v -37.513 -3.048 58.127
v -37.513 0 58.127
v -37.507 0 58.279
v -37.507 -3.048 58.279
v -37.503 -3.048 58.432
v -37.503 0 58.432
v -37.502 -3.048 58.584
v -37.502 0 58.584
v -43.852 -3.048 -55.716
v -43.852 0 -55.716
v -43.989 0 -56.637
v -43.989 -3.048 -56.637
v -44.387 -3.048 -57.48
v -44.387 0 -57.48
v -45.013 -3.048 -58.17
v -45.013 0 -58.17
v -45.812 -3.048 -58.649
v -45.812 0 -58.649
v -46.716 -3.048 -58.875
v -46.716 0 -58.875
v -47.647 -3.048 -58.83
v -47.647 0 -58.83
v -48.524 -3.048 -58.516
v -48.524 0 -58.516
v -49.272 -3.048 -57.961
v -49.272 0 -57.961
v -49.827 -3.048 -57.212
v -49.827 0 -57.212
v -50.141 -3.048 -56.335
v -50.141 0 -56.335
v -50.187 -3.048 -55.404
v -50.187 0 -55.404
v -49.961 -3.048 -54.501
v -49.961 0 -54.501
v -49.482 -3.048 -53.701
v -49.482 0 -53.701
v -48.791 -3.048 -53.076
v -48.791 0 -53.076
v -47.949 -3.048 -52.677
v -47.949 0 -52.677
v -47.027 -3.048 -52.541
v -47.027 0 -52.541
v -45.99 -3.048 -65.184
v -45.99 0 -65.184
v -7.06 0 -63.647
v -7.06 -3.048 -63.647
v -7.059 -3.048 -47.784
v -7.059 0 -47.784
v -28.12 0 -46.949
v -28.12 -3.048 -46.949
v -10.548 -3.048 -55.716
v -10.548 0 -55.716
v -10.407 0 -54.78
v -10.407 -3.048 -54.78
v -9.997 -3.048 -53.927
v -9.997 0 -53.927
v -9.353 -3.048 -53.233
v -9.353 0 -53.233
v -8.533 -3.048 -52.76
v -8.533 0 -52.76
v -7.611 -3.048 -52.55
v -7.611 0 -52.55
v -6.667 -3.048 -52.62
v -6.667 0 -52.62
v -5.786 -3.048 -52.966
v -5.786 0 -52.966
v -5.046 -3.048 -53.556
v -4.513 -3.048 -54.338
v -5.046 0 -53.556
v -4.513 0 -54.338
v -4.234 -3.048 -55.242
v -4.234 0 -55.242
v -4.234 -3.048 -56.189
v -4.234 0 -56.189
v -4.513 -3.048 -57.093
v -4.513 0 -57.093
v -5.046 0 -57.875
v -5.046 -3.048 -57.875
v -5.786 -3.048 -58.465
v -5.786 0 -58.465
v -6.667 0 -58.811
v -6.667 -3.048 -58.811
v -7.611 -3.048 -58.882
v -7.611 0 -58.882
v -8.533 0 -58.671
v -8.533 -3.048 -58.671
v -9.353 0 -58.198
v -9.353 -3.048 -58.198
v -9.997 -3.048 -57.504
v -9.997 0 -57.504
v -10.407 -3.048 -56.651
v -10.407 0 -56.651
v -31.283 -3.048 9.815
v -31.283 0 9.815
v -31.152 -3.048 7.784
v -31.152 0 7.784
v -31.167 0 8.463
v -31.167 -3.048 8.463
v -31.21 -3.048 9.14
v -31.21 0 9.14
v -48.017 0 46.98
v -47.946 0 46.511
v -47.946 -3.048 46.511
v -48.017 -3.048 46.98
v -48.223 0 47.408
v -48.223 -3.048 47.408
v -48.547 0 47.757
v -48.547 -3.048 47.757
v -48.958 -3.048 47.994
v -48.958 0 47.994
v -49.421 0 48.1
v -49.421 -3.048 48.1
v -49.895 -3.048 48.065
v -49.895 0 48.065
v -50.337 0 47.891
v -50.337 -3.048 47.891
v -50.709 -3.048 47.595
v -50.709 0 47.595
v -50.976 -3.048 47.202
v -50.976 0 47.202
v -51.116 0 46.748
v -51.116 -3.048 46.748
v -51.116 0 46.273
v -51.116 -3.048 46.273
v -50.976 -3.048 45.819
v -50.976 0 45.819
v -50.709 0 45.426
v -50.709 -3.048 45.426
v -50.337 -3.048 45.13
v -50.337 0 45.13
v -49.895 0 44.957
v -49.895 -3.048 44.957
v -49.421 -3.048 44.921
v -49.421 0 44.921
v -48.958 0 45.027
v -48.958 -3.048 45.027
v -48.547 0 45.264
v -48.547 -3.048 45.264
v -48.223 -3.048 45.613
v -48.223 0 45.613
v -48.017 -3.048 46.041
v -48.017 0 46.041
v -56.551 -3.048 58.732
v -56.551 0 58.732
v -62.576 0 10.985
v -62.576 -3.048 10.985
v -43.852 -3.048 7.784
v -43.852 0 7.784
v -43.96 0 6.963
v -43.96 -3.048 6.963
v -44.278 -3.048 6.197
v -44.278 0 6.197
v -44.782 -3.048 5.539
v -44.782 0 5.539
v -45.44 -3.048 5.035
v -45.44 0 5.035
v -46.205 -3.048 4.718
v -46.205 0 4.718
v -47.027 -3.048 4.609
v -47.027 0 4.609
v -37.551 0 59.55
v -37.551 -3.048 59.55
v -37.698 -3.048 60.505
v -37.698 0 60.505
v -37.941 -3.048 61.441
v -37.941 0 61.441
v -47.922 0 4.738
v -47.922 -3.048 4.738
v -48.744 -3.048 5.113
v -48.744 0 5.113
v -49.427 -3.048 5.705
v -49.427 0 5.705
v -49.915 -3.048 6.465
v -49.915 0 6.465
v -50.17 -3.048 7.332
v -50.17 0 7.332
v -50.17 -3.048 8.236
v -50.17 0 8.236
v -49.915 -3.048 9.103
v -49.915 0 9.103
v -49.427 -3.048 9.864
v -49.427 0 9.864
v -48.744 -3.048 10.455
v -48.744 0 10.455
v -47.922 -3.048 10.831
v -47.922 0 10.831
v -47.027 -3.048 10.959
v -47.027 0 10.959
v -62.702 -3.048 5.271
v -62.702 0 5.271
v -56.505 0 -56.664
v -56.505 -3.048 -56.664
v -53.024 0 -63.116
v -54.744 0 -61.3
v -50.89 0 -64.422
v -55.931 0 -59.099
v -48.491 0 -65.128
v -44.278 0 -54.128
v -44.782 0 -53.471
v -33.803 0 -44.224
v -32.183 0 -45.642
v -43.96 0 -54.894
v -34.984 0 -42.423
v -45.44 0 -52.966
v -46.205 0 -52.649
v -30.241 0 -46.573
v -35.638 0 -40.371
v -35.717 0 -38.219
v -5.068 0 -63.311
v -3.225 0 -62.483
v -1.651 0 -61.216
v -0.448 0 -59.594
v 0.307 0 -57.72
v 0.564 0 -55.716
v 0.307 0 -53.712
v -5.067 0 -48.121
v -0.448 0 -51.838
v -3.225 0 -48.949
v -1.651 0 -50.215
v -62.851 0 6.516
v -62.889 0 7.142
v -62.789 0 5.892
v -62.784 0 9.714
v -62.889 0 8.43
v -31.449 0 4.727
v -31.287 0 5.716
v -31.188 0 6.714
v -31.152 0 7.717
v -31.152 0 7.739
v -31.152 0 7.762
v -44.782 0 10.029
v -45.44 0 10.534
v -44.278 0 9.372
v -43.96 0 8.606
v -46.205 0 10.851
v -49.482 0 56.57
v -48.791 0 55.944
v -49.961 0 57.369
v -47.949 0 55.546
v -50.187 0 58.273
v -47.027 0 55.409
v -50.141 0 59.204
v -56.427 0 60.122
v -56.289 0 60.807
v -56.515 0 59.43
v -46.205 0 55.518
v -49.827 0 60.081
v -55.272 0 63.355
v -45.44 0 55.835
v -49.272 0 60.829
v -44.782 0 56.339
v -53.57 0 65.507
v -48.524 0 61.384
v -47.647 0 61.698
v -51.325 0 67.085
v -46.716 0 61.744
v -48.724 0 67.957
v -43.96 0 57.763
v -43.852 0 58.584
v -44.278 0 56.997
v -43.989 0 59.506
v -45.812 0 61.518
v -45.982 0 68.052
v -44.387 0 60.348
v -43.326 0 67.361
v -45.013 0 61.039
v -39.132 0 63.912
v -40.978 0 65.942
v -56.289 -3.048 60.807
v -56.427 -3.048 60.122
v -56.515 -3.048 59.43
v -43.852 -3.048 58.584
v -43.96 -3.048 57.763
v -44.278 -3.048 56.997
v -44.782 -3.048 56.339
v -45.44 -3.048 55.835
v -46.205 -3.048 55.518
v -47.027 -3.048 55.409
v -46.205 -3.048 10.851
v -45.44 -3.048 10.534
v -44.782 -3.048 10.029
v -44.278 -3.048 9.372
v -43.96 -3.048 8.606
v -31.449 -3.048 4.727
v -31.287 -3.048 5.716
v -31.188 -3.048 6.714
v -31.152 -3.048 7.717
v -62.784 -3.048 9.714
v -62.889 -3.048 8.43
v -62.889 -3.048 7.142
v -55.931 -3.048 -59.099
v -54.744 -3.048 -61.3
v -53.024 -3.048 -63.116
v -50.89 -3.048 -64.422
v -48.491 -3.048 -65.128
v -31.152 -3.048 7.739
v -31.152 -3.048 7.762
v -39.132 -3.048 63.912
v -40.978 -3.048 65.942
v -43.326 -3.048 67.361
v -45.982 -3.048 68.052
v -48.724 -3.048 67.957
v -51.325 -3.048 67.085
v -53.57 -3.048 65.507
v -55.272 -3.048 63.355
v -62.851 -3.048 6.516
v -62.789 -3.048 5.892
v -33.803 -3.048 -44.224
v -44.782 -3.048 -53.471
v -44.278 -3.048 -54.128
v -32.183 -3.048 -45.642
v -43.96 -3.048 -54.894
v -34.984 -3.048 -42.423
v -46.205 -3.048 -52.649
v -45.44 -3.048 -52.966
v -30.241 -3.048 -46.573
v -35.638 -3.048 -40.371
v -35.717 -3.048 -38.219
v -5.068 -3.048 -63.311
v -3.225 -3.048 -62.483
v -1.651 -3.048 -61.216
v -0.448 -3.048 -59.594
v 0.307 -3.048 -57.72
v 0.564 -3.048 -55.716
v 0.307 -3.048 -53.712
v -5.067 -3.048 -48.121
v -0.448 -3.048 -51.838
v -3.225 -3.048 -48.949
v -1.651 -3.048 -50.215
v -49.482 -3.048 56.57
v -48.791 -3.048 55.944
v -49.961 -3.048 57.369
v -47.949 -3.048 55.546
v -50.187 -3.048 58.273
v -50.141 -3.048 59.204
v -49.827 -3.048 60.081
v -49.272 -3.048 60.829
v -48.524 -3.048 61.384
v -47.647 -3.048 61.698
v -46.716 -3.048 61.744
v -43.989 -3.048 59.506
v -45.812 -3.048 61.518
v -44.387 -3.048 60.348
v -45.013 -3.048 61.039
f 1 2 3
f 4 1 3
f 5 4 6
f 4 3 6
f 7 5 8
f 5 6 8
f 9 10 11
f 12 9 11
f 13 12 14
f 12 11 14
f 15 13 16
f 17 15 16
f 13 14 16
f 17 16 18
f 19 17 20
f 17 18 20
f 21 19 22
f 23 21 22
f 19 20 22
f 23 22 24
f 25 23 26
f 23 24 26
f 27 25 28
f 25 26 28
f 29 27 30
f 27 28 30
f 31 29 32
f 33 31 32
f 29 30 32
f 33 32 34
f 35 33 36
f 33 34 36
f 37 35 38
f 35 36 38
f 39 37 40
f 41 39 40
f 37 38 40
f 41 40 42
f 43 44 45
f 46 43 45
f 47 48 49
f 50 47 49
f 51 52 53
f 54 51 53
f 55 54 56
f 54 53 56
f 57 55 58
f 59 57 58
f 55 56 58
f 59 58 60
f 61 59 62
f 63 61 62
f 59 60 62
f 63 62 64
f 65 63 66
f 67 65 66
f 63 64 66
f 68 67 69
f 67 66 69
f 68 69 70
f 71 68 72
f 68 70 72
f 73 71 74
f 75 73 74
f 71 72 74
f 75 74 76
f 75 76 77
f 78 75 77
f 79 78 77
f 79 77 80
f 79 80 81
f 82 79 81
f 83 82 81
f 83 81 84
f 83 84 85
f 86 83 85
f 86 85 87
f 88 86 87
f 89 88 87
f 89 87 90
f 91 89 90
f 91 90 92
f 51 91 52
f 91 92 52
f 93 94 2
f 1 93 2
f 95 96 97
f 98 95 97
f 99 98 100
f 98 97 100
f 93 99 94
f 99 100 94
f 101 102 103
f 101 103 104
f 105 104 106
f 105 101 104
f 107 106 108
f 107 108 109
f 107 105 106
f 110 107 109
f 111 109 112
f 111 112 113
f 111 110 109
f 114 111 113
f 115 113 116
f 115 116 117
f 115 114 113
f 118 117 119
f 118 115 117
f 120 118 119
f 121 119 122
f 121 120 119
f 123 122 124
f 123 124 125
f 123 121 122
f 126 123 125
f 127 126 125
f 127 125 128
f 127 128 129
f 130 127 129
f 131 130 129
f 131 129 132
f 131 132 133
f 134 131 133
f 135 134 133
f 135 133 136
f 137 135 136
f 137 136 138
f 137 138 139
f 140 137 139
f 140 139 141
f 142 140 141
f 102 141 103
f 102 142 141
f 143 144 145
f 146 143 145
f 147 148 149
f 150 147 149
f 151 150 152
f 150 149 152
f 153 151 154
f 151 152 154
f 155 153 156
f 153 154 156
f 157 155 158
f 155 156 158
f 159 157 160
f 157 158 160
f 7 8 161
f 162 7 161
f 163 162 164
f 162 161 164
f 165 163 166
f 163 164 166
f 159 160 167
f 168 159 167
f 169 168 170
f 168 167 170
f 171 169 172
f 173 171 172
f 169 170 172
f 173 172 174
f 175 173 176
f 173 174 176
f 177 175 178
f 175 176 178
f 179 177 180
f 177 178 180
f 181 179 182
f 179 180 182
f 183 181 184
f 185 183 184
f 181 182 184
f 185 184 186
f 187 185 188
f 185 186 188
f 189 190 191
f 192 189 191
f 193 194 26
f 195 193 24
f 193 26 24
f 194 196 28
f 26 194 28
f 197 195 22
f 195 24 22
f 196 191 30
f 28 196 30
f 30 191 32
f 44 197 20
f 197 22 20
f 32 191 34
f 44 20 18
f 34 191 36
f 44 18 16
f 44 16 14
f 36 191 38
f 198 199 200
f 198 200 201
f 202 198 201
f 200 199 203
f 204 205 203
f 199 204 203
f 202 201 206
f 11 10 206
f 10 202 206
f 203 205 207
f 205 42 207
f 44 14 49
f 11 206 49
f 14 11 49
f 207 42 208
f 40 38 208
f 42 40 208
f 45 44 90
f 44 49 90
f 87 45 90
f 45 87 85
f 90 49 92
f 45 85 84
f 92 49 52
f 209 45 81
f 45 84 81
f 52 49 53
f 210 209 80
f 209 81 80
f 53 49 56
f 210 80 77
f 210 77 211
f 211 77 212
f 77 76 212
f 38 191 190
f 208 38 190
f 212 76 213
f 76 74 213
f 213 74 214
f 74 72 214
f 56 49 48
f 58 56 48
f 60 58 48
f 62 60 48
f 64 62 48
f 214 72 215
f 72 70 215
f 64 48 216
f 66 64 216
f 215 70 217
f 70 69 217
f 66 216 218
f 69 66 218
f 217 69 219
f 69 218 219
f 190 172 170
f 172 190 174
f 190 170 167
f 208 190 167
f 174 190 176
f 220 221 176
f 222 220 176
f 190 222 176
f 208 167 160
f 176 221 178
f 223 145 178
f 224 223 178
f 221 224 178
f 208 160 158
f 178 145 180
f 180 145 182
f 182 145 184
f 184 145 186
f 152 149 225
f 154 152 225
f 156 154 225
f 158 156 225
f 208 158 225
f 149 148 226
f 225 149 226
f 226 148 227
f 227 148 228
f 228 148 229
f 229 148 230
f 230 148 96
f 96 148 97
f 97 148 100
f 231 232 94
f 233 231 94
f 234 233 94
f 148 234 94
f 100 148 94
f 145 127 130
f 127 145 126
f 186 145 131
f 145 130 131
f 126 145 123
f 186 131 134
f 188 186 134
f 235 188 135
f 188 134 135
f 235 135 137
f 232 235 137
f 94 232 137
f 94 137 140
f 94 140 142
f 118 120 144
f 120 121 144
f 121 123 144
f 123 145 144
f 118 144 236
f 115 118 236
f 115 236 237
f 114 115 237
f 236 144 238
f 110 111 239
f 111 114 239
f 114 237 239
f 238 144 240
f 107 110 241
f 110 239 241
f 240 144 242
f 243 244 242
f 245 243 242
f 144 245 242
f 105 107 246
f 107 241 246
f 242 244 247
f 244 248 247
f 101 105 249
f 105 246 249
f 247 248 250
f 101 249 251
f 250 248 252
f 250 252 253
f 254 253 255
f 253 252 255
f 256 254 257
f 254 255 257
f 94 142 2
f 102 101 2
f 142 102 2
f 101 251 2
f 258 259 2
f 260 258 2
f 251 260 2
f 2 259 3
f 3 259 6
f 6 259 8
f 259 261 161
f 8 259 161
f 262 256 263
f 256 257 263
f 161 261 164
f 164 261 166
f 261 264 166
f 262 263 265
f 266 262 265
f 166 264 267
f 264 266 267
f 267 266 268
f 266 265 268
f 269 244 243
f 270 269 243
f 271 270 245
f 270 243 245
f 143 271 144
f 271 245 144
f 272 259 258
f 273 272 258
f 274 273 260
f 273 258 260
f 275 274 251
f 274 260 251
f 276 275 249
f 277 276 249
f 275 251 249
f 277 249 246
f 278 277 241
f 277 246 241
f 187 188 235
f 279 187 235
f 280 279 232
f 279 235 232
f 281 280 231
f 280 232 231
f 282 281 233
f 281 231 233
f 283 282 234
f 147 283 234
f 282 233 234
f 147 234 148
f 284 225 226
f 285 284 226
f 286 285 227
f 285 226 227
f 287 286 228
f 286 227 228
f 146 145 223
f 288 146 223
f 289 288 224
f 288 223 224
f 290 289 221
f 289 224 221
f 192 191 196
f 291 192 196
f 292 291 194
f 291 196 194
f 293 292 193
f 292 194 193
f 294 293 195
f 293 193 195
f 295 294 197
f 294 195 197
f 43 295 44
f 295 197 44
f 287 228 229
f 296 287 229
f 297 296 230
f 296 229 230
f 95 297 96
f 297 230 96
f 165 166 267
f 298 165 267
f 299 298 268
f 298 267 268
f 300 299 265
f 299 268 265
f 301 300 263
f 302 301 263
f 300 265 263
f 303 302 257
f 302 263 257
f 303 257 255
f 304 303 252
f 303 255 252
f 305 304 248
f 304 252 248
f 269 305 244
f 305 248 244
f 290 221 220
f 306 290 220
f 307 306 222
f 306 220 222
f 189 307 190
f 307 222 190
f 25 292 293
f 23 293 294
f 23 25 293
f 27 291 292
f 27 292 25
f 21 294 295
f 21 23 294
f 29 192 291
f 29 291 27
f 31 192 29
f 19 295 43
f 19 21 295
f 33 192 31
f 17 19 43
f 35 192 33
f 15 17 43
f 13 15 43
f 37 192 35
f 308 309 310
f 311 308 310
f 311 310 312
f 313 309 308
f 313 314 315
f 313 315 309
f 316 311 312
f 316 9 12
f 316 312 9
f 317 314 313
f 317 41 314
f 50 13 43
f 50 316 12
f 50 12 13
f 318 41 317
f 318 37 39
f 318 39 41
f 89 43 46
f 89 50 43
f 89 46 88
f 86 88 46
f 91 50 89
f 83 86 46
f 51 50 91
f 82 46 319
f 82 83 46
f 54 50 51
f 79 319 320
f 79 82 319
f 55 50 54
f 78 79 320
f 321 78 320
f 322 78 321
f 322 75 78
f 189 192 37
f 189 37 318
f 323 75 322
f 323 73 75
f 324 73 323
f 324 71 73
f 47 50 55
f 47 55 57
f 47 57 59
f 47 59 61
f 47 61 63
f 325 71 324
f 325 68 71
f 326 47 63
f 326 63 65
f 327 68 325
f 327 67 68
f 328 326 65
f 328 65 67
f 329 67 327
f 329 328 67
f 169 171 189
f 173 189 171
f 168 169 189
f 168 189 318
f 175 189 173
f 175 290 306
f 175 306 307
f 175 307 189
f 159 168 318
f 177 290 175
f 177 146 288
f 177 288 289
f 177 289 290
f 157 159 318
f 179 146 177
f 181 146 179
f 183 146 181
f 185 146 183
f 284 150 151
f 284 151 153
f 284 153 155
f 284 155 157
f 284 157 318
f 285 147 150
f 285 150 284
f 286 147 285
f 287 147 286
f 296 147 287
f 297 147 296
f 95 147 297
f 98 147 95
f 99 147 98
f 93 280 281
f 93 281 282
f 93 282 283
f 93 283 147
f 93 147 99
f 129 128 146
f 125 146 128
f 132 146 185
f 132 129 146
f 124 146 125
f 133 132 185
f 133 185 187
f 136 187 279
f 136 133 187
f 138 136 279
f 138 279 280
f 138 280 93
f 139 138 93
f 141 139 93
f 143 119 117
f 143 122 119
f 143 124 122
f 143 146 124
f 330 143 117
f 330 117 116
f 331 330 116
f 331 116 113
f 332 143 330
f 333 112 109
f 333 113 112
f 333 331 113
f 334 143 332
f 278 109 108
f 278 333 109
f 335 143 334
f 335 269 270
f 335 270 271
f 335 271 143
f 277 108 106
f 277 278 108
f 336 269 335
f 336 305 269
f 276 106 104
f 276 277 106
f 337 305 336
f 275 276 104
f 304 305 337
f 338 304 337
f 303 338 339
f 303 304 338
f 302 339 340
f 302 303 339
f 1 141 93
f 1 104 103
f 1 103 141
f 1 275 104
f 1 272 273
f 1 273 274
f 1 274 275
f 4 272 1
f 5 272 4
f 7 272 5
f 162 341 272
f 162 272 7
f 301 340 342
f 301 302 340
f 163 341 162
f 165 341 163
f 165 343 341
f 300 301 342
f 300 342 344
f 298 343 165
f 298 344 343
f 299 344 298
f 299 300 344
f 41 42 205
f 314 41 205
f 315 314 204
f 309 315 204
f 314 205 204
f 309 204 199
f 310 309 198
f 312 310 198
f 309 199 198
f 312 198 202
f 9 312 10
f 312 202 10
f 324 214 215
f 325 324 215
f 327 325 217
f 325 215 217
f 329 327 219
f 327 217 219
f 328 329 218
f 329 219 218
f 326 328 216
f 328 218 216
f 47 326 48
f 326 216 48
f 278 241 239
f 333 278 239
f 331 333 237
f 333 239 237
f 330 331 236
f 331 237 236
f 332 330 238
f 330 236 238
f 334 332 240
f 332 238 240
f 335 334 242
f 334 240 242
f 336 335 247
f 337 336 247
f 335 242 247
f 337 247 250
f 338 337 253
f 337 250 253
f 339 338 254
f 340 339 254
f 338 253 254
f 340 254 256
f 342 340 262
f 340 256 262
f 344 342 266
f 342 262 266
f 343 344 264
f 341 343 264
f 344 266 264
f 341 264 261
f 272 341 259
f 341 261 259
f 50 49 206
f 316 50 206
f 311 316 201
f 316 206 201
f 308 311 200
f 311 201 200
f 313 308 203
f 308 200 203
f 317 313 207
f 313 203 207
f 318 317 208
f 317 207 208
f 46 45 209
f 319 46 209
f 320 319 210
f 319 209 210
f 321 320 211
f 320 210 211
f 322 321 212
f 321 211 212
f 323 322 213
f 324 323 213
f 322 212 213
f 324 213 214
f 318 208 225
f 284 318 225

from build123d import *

# Parameters (mm, degrees)
F0_R     = 1.5939084554
F1_DEPTH = 3.048


with BuildPart() as f1:
    # F0 (on Front) → F1 (new body)
    with BuildSketch(Plane.XZ):
        with BuildLine():
            ThreePointArc((-37.513228268, 58.1266457065), (-37.5049761739, 58.3554311802), (-37.5022249461, 58.5843488964))
            ThreePointArc((-37.5022249461, 58.5843488964), (-37.6124710423, 60.0293519865), (-37.9406572675, 61.4409050085))
            Line((-37.9406572675, 61.4409050085), (-37.513228268, 58.1266457065))
        make_face()
        with BuildLine():
            Line((-37.513228268, 58.1266457065), (-37.9406572675, 61.4409050085))
            ThreePointArc((-37.9406572675, 61.4409050085), (-47.3561500663, 68.1036678461), (-56.2892930862, 60.8068967067))
            Line((-56.2892930862, 60.8068967067), (-56.5510749385, 58.7323567411))
            ThreePointArc((-56.5510749385, 58.7323567411), (-53.8145439942, 51.9016903581), (-47.0272249461, 49.0593488964))
            ThreePointArc((-47.0272249461, 49.0593488964), (-40.4558475366, 51.689232948), (-37.513228268, 58.1266457065))
        make_face()
        with BuildLine():
            ThreePointArc((-43.8522249461, 58.5843488964), (-44.7821609158, 56.3392848661), (-47.0272249461, 55.4093488964))
            ThreePointArc((-47.0272249461, 55.4093488964), (-49.2722889764, 60.8294129267), (-43.8522249461, 58.5843488964))
        make_face(mode=Mode.SUBTRACT)
        with BuildLine():
            Line((-31.2826202902, 9.8148781945), (-37.513228268, 58.1266457065))
            ThreePointArc((-37.513228268, 58.1266457065), (-40.4558475366, 51.689232948), (-47.0272249461, 49.0593488964))
            Line((-47.0272249461, 49.0593488964), (-47.0272249461, 23.6593488964))
            ThreePointArc((-47.0272249461, 23.6593488964), (-36.5443586302, 19.7059737355), (-31.2826202902, 9.8148781945))
        make_face()
        with BuildLine():
            Line((-56.5510749385, 58.7323567411), (-56.2892930862, 60.8068967067))
            ThreePointArc((-56.2892930862, 60.8068967067), (-56.4772836251, 59.7768320044), (-56.5510749385, 58.7323567411))
        make_face()
        with BuildLine():
            Line((-47.0272249461, 23.6593488964), (-47.0272249461, 49.0593488964))
            ThreePointArc((-47.0272249461, 49.0593488964), (-53.8145439942, 51.9016903581), (-56.5510749385, 58.7323567411))
            Line((-56.5510749385, 58.7323567411), (-62.5761934224, 10.9851619686))
            ThreePointArc((-62.5761934224, 10.9851619686), (-57.0572478145, 20.0893993335), (-47.0272249461, 23.6593488964))
        make_face()
        with Locations((-49.5402999222, 46.5105995536)):
            Circle(F0_R, mode=Mode.SUBTRACT)
        with BuildLine():
            ThreePointArc((-31.1522249461, 7.7843488964), (-31.1848573214, 8.8017048047), (-31.2826202902, 9.8148781945))
            ThreePointArc((-31.2826202902, 9.8148781945), (-36.5443586302, 19.7059737355), (-47.0272249461, 23.6593488964))
            Line((-47.0272249461, 23.6593488964), (-47.0272249461, 10.9593488964))
            ThreePointArc((-47.0272249461, 10.9593488964), (-44.7821609158, 10.0294129267), (-43.8522249461, 7.7843488964))
            ThreePointArc((-43.8522249461, 7.7843488964), (-44.7821609158, 5.5392848661), (-47.0272249461, 4.6093488964))
            Line((-47.0272249461, 4.6093488964), (-47.0272249461, -8.0906511036))
            ThreePointArc((-47.0272249461, -8.0906511036), (-36.9406754756, -4.4744089844), (-31.4494526235, 4.7267952233))
            Line((-31.4494526235, 4.7267952233), (-31.1523694634, 7.7166111531))
            ThreePointArc((-31.1523694634, 7.7166111531), (-31.1522610755, 7.7504799477), (-31.1522249461, 7.7843488964))
        make_face()
        with BuildLine():
            Line((-47.0272249461, 10.9593488964), (-47.0272249461, 23.6593488964))
            ThreePointArc((-47.0272249461, 23.6593488964), (-57.0572478145, 20.0893993335), (-62.5761934224, 10.9851619686))
            ThreePointArc((-62.5761934224, 10.9851619686), (-62.849805464, 9.0733681958), (-62.8892440844, 7.1424970002))
            Line((-62.8892440844, 7.1424970002), (-62.7019557202, 5.2706981331))
            ThreePointArc((-62.7019557202, 5.2706981331), (-57.3255602274, -4.2970382521), (-47.0272249461, -8.0906511036))
            Line((-47.0272249461, -8.0906511036), (-47.0272249461, 4.6093488964))
            ThreePointArc((-47.0272249461, 4.6093488964), (-50.2022249461, 7.7843488964), (-47.0272249461, 10.9593488964))
        make_face()
        with BuildLine():
            ThreePointArc((-31.4494526235, 4.7267952233), (-31.2300195353, 6.2146590511), (-31.1523694634, 7.7166111531))
            Line((-31.1523694634, 7.7166111531), (-31.4494526235, 4.7267952233))
        make_face()
        with BuildLine():
            Line((-62.7019557202, 5.2706981331), (-62.8892440844, 7.1424970002))
            ThreePointArc((-62.8892440844, 7.1424970002), (-62.8233496768, 6.203820981), (-62.7019557202, 5.2706981331))
        make_face()
        with BuildLine():
            Line((-35.7167991292, -38.2193635433), (-31.4494526235, 4.7267952233))
            ThreePointArc((-31.4494526235, 4.7267952233), (-36.9406754756, -4.4744089844), (-47.0272249461, -8.0906511036))
            Line((-47.0272249461, -8.0906511036), (-47.0272249461, -46.1906511036))
            ThreePointArc((-47.0272249461, -46.1906511036), (-40.2920328553, -48.9804590128), (-37.5022249461, -55.7156511036))
            Line((-37.5022249461, -55.7156511036), (-15.310948927, -55.7156511036))
            ThreePointArc((-15.310948927, -55.7156511036), (-12.8738194092, -49.9929043149), (-7.0590230542, -47.7843811788))
            Line((-7.0590230542, -47.7843811788), (-28.1204876136, -46.9494241745))
            ThreePointArc((-28.1204876136, -46.9494241745), (-33.8031377964, -44.2241541431), (-35.7167991292, -38.2193635433))
        make_face()
        with BuildLine():
            ThreePointArc((-47.0272249461, -8.0906511036), (-57.3255602274, -4.2970382521), (-62.7019557202, 5.2706981331))
            Line((-62.7019557202, 5.2706981331), (-56.5048997845, -56.6639678528))
            ThreePointArc((-56.5048997845, -56.6639678528), (-54.0897436907, -49.3245280425), (-47.0272249461, -46.1906511036))
            Line((-47.0272249461, -46.1906511036), (-47.0272249461, -8.0906511036))
        make_face()
        with BuildLine():
            ThreePointArc((-47.0272249461, -46.1906511036), (-54.0897436907, -49.3245280425), (-56.5048997845, -56.6639678528))
            ThreePointArc((-56.5048997845, -56.6639678528), (-53.0237393117, -63.1161538205), (-45.9900241775, -65.1840110231))
            ThreePointArc((-45.9900241775, -65.1840110231), (-39.9348007371, -62.0735708766), (-37.5022249461, -55.7156511036))
            Line((-37.5022249461, -55.7156511036), (-43.8522249461, -55.7156511036))
            ThreePointArc((-43.8522249461, -55.7156511036), (-49.2722889764, -57.9607151339), (-47.0272249461, -52.5406511036))
            Line((-47.0272249461, -52.5406511036), (-47.0272249461, -46.1906511036))
        make_face()
        with BuildLine():
            ThreePointArc((-37.5022249461, -55.7156511036), (-39.9348007371, -62.0735708766), (-45.9900241775, -65.1840110231))
            Line((-45.9900241775, -65.1840110231), (-7.0603012501, -63.6469715978))
            ThreePointArc((-7.0603012501, -63.6469715978), (-12.8742805261, -61.4379546579), (-15.310948927, -55.7156511036))
            Line((-15.310948927, -55.7156511036), (-37.5022249461, -55.7156511036))
        make_face()
        with BuildLine():
            ThreePointArc((0.564051073, -55.7156511036), (-1.6507021383, -50.2152806213), (-7.0590230542, -47.7843811788))
            ThreePointArc((-7.0590230542, -47.7843811788), (-12.8738194092, -49.9929043149), (-15.310948927, -55.7156511036))
            ThreePointArc((-15.310948927, -55.7156511036), (-12.8742805261, -61.4379546579), (-7.0603012501, -63.6469715978))
            ThreePointArc((-7.0603012501, -63.6469715978), (-1.6511453727, -61.2164827028), (0.564051073, -55.7156511036))
        make_face()
        with BuildLine():
            ThreePointArc((-4.198448927, -55.7156511036), (-7.373448927, -58.8906511036), (-10.548448927, -55.7156511036))
            ThreePointArc((-10.548448927, -55.7156511036), (-7.373448927, -52.5406511036), (-4.198448927, -55.7156511036))
        make_face(mode=Mode.SUBTRACT)
        with BuildLine():
            ThreePointArc((-37.5022249461, -55.7156511036), (-40.2920328553, -48.9804590128), (-47.0272249461, -46.1906511036))
            Line((-47.0272249461, -46.1906511036), (-47.0272249461, -52.5406511036))
            ThreePointArc((-47.0272249461, -52.5406511036), (-44.7821609158, -53.4705870733), (-43.8522249461, -55.7156511036))
            Line((-43.8522249461, -55.7156511036), (-37.5022249461, -55.7156511036))
        make_face()
    extrude(amount=F1_DEPTH)


solid = f1.part
